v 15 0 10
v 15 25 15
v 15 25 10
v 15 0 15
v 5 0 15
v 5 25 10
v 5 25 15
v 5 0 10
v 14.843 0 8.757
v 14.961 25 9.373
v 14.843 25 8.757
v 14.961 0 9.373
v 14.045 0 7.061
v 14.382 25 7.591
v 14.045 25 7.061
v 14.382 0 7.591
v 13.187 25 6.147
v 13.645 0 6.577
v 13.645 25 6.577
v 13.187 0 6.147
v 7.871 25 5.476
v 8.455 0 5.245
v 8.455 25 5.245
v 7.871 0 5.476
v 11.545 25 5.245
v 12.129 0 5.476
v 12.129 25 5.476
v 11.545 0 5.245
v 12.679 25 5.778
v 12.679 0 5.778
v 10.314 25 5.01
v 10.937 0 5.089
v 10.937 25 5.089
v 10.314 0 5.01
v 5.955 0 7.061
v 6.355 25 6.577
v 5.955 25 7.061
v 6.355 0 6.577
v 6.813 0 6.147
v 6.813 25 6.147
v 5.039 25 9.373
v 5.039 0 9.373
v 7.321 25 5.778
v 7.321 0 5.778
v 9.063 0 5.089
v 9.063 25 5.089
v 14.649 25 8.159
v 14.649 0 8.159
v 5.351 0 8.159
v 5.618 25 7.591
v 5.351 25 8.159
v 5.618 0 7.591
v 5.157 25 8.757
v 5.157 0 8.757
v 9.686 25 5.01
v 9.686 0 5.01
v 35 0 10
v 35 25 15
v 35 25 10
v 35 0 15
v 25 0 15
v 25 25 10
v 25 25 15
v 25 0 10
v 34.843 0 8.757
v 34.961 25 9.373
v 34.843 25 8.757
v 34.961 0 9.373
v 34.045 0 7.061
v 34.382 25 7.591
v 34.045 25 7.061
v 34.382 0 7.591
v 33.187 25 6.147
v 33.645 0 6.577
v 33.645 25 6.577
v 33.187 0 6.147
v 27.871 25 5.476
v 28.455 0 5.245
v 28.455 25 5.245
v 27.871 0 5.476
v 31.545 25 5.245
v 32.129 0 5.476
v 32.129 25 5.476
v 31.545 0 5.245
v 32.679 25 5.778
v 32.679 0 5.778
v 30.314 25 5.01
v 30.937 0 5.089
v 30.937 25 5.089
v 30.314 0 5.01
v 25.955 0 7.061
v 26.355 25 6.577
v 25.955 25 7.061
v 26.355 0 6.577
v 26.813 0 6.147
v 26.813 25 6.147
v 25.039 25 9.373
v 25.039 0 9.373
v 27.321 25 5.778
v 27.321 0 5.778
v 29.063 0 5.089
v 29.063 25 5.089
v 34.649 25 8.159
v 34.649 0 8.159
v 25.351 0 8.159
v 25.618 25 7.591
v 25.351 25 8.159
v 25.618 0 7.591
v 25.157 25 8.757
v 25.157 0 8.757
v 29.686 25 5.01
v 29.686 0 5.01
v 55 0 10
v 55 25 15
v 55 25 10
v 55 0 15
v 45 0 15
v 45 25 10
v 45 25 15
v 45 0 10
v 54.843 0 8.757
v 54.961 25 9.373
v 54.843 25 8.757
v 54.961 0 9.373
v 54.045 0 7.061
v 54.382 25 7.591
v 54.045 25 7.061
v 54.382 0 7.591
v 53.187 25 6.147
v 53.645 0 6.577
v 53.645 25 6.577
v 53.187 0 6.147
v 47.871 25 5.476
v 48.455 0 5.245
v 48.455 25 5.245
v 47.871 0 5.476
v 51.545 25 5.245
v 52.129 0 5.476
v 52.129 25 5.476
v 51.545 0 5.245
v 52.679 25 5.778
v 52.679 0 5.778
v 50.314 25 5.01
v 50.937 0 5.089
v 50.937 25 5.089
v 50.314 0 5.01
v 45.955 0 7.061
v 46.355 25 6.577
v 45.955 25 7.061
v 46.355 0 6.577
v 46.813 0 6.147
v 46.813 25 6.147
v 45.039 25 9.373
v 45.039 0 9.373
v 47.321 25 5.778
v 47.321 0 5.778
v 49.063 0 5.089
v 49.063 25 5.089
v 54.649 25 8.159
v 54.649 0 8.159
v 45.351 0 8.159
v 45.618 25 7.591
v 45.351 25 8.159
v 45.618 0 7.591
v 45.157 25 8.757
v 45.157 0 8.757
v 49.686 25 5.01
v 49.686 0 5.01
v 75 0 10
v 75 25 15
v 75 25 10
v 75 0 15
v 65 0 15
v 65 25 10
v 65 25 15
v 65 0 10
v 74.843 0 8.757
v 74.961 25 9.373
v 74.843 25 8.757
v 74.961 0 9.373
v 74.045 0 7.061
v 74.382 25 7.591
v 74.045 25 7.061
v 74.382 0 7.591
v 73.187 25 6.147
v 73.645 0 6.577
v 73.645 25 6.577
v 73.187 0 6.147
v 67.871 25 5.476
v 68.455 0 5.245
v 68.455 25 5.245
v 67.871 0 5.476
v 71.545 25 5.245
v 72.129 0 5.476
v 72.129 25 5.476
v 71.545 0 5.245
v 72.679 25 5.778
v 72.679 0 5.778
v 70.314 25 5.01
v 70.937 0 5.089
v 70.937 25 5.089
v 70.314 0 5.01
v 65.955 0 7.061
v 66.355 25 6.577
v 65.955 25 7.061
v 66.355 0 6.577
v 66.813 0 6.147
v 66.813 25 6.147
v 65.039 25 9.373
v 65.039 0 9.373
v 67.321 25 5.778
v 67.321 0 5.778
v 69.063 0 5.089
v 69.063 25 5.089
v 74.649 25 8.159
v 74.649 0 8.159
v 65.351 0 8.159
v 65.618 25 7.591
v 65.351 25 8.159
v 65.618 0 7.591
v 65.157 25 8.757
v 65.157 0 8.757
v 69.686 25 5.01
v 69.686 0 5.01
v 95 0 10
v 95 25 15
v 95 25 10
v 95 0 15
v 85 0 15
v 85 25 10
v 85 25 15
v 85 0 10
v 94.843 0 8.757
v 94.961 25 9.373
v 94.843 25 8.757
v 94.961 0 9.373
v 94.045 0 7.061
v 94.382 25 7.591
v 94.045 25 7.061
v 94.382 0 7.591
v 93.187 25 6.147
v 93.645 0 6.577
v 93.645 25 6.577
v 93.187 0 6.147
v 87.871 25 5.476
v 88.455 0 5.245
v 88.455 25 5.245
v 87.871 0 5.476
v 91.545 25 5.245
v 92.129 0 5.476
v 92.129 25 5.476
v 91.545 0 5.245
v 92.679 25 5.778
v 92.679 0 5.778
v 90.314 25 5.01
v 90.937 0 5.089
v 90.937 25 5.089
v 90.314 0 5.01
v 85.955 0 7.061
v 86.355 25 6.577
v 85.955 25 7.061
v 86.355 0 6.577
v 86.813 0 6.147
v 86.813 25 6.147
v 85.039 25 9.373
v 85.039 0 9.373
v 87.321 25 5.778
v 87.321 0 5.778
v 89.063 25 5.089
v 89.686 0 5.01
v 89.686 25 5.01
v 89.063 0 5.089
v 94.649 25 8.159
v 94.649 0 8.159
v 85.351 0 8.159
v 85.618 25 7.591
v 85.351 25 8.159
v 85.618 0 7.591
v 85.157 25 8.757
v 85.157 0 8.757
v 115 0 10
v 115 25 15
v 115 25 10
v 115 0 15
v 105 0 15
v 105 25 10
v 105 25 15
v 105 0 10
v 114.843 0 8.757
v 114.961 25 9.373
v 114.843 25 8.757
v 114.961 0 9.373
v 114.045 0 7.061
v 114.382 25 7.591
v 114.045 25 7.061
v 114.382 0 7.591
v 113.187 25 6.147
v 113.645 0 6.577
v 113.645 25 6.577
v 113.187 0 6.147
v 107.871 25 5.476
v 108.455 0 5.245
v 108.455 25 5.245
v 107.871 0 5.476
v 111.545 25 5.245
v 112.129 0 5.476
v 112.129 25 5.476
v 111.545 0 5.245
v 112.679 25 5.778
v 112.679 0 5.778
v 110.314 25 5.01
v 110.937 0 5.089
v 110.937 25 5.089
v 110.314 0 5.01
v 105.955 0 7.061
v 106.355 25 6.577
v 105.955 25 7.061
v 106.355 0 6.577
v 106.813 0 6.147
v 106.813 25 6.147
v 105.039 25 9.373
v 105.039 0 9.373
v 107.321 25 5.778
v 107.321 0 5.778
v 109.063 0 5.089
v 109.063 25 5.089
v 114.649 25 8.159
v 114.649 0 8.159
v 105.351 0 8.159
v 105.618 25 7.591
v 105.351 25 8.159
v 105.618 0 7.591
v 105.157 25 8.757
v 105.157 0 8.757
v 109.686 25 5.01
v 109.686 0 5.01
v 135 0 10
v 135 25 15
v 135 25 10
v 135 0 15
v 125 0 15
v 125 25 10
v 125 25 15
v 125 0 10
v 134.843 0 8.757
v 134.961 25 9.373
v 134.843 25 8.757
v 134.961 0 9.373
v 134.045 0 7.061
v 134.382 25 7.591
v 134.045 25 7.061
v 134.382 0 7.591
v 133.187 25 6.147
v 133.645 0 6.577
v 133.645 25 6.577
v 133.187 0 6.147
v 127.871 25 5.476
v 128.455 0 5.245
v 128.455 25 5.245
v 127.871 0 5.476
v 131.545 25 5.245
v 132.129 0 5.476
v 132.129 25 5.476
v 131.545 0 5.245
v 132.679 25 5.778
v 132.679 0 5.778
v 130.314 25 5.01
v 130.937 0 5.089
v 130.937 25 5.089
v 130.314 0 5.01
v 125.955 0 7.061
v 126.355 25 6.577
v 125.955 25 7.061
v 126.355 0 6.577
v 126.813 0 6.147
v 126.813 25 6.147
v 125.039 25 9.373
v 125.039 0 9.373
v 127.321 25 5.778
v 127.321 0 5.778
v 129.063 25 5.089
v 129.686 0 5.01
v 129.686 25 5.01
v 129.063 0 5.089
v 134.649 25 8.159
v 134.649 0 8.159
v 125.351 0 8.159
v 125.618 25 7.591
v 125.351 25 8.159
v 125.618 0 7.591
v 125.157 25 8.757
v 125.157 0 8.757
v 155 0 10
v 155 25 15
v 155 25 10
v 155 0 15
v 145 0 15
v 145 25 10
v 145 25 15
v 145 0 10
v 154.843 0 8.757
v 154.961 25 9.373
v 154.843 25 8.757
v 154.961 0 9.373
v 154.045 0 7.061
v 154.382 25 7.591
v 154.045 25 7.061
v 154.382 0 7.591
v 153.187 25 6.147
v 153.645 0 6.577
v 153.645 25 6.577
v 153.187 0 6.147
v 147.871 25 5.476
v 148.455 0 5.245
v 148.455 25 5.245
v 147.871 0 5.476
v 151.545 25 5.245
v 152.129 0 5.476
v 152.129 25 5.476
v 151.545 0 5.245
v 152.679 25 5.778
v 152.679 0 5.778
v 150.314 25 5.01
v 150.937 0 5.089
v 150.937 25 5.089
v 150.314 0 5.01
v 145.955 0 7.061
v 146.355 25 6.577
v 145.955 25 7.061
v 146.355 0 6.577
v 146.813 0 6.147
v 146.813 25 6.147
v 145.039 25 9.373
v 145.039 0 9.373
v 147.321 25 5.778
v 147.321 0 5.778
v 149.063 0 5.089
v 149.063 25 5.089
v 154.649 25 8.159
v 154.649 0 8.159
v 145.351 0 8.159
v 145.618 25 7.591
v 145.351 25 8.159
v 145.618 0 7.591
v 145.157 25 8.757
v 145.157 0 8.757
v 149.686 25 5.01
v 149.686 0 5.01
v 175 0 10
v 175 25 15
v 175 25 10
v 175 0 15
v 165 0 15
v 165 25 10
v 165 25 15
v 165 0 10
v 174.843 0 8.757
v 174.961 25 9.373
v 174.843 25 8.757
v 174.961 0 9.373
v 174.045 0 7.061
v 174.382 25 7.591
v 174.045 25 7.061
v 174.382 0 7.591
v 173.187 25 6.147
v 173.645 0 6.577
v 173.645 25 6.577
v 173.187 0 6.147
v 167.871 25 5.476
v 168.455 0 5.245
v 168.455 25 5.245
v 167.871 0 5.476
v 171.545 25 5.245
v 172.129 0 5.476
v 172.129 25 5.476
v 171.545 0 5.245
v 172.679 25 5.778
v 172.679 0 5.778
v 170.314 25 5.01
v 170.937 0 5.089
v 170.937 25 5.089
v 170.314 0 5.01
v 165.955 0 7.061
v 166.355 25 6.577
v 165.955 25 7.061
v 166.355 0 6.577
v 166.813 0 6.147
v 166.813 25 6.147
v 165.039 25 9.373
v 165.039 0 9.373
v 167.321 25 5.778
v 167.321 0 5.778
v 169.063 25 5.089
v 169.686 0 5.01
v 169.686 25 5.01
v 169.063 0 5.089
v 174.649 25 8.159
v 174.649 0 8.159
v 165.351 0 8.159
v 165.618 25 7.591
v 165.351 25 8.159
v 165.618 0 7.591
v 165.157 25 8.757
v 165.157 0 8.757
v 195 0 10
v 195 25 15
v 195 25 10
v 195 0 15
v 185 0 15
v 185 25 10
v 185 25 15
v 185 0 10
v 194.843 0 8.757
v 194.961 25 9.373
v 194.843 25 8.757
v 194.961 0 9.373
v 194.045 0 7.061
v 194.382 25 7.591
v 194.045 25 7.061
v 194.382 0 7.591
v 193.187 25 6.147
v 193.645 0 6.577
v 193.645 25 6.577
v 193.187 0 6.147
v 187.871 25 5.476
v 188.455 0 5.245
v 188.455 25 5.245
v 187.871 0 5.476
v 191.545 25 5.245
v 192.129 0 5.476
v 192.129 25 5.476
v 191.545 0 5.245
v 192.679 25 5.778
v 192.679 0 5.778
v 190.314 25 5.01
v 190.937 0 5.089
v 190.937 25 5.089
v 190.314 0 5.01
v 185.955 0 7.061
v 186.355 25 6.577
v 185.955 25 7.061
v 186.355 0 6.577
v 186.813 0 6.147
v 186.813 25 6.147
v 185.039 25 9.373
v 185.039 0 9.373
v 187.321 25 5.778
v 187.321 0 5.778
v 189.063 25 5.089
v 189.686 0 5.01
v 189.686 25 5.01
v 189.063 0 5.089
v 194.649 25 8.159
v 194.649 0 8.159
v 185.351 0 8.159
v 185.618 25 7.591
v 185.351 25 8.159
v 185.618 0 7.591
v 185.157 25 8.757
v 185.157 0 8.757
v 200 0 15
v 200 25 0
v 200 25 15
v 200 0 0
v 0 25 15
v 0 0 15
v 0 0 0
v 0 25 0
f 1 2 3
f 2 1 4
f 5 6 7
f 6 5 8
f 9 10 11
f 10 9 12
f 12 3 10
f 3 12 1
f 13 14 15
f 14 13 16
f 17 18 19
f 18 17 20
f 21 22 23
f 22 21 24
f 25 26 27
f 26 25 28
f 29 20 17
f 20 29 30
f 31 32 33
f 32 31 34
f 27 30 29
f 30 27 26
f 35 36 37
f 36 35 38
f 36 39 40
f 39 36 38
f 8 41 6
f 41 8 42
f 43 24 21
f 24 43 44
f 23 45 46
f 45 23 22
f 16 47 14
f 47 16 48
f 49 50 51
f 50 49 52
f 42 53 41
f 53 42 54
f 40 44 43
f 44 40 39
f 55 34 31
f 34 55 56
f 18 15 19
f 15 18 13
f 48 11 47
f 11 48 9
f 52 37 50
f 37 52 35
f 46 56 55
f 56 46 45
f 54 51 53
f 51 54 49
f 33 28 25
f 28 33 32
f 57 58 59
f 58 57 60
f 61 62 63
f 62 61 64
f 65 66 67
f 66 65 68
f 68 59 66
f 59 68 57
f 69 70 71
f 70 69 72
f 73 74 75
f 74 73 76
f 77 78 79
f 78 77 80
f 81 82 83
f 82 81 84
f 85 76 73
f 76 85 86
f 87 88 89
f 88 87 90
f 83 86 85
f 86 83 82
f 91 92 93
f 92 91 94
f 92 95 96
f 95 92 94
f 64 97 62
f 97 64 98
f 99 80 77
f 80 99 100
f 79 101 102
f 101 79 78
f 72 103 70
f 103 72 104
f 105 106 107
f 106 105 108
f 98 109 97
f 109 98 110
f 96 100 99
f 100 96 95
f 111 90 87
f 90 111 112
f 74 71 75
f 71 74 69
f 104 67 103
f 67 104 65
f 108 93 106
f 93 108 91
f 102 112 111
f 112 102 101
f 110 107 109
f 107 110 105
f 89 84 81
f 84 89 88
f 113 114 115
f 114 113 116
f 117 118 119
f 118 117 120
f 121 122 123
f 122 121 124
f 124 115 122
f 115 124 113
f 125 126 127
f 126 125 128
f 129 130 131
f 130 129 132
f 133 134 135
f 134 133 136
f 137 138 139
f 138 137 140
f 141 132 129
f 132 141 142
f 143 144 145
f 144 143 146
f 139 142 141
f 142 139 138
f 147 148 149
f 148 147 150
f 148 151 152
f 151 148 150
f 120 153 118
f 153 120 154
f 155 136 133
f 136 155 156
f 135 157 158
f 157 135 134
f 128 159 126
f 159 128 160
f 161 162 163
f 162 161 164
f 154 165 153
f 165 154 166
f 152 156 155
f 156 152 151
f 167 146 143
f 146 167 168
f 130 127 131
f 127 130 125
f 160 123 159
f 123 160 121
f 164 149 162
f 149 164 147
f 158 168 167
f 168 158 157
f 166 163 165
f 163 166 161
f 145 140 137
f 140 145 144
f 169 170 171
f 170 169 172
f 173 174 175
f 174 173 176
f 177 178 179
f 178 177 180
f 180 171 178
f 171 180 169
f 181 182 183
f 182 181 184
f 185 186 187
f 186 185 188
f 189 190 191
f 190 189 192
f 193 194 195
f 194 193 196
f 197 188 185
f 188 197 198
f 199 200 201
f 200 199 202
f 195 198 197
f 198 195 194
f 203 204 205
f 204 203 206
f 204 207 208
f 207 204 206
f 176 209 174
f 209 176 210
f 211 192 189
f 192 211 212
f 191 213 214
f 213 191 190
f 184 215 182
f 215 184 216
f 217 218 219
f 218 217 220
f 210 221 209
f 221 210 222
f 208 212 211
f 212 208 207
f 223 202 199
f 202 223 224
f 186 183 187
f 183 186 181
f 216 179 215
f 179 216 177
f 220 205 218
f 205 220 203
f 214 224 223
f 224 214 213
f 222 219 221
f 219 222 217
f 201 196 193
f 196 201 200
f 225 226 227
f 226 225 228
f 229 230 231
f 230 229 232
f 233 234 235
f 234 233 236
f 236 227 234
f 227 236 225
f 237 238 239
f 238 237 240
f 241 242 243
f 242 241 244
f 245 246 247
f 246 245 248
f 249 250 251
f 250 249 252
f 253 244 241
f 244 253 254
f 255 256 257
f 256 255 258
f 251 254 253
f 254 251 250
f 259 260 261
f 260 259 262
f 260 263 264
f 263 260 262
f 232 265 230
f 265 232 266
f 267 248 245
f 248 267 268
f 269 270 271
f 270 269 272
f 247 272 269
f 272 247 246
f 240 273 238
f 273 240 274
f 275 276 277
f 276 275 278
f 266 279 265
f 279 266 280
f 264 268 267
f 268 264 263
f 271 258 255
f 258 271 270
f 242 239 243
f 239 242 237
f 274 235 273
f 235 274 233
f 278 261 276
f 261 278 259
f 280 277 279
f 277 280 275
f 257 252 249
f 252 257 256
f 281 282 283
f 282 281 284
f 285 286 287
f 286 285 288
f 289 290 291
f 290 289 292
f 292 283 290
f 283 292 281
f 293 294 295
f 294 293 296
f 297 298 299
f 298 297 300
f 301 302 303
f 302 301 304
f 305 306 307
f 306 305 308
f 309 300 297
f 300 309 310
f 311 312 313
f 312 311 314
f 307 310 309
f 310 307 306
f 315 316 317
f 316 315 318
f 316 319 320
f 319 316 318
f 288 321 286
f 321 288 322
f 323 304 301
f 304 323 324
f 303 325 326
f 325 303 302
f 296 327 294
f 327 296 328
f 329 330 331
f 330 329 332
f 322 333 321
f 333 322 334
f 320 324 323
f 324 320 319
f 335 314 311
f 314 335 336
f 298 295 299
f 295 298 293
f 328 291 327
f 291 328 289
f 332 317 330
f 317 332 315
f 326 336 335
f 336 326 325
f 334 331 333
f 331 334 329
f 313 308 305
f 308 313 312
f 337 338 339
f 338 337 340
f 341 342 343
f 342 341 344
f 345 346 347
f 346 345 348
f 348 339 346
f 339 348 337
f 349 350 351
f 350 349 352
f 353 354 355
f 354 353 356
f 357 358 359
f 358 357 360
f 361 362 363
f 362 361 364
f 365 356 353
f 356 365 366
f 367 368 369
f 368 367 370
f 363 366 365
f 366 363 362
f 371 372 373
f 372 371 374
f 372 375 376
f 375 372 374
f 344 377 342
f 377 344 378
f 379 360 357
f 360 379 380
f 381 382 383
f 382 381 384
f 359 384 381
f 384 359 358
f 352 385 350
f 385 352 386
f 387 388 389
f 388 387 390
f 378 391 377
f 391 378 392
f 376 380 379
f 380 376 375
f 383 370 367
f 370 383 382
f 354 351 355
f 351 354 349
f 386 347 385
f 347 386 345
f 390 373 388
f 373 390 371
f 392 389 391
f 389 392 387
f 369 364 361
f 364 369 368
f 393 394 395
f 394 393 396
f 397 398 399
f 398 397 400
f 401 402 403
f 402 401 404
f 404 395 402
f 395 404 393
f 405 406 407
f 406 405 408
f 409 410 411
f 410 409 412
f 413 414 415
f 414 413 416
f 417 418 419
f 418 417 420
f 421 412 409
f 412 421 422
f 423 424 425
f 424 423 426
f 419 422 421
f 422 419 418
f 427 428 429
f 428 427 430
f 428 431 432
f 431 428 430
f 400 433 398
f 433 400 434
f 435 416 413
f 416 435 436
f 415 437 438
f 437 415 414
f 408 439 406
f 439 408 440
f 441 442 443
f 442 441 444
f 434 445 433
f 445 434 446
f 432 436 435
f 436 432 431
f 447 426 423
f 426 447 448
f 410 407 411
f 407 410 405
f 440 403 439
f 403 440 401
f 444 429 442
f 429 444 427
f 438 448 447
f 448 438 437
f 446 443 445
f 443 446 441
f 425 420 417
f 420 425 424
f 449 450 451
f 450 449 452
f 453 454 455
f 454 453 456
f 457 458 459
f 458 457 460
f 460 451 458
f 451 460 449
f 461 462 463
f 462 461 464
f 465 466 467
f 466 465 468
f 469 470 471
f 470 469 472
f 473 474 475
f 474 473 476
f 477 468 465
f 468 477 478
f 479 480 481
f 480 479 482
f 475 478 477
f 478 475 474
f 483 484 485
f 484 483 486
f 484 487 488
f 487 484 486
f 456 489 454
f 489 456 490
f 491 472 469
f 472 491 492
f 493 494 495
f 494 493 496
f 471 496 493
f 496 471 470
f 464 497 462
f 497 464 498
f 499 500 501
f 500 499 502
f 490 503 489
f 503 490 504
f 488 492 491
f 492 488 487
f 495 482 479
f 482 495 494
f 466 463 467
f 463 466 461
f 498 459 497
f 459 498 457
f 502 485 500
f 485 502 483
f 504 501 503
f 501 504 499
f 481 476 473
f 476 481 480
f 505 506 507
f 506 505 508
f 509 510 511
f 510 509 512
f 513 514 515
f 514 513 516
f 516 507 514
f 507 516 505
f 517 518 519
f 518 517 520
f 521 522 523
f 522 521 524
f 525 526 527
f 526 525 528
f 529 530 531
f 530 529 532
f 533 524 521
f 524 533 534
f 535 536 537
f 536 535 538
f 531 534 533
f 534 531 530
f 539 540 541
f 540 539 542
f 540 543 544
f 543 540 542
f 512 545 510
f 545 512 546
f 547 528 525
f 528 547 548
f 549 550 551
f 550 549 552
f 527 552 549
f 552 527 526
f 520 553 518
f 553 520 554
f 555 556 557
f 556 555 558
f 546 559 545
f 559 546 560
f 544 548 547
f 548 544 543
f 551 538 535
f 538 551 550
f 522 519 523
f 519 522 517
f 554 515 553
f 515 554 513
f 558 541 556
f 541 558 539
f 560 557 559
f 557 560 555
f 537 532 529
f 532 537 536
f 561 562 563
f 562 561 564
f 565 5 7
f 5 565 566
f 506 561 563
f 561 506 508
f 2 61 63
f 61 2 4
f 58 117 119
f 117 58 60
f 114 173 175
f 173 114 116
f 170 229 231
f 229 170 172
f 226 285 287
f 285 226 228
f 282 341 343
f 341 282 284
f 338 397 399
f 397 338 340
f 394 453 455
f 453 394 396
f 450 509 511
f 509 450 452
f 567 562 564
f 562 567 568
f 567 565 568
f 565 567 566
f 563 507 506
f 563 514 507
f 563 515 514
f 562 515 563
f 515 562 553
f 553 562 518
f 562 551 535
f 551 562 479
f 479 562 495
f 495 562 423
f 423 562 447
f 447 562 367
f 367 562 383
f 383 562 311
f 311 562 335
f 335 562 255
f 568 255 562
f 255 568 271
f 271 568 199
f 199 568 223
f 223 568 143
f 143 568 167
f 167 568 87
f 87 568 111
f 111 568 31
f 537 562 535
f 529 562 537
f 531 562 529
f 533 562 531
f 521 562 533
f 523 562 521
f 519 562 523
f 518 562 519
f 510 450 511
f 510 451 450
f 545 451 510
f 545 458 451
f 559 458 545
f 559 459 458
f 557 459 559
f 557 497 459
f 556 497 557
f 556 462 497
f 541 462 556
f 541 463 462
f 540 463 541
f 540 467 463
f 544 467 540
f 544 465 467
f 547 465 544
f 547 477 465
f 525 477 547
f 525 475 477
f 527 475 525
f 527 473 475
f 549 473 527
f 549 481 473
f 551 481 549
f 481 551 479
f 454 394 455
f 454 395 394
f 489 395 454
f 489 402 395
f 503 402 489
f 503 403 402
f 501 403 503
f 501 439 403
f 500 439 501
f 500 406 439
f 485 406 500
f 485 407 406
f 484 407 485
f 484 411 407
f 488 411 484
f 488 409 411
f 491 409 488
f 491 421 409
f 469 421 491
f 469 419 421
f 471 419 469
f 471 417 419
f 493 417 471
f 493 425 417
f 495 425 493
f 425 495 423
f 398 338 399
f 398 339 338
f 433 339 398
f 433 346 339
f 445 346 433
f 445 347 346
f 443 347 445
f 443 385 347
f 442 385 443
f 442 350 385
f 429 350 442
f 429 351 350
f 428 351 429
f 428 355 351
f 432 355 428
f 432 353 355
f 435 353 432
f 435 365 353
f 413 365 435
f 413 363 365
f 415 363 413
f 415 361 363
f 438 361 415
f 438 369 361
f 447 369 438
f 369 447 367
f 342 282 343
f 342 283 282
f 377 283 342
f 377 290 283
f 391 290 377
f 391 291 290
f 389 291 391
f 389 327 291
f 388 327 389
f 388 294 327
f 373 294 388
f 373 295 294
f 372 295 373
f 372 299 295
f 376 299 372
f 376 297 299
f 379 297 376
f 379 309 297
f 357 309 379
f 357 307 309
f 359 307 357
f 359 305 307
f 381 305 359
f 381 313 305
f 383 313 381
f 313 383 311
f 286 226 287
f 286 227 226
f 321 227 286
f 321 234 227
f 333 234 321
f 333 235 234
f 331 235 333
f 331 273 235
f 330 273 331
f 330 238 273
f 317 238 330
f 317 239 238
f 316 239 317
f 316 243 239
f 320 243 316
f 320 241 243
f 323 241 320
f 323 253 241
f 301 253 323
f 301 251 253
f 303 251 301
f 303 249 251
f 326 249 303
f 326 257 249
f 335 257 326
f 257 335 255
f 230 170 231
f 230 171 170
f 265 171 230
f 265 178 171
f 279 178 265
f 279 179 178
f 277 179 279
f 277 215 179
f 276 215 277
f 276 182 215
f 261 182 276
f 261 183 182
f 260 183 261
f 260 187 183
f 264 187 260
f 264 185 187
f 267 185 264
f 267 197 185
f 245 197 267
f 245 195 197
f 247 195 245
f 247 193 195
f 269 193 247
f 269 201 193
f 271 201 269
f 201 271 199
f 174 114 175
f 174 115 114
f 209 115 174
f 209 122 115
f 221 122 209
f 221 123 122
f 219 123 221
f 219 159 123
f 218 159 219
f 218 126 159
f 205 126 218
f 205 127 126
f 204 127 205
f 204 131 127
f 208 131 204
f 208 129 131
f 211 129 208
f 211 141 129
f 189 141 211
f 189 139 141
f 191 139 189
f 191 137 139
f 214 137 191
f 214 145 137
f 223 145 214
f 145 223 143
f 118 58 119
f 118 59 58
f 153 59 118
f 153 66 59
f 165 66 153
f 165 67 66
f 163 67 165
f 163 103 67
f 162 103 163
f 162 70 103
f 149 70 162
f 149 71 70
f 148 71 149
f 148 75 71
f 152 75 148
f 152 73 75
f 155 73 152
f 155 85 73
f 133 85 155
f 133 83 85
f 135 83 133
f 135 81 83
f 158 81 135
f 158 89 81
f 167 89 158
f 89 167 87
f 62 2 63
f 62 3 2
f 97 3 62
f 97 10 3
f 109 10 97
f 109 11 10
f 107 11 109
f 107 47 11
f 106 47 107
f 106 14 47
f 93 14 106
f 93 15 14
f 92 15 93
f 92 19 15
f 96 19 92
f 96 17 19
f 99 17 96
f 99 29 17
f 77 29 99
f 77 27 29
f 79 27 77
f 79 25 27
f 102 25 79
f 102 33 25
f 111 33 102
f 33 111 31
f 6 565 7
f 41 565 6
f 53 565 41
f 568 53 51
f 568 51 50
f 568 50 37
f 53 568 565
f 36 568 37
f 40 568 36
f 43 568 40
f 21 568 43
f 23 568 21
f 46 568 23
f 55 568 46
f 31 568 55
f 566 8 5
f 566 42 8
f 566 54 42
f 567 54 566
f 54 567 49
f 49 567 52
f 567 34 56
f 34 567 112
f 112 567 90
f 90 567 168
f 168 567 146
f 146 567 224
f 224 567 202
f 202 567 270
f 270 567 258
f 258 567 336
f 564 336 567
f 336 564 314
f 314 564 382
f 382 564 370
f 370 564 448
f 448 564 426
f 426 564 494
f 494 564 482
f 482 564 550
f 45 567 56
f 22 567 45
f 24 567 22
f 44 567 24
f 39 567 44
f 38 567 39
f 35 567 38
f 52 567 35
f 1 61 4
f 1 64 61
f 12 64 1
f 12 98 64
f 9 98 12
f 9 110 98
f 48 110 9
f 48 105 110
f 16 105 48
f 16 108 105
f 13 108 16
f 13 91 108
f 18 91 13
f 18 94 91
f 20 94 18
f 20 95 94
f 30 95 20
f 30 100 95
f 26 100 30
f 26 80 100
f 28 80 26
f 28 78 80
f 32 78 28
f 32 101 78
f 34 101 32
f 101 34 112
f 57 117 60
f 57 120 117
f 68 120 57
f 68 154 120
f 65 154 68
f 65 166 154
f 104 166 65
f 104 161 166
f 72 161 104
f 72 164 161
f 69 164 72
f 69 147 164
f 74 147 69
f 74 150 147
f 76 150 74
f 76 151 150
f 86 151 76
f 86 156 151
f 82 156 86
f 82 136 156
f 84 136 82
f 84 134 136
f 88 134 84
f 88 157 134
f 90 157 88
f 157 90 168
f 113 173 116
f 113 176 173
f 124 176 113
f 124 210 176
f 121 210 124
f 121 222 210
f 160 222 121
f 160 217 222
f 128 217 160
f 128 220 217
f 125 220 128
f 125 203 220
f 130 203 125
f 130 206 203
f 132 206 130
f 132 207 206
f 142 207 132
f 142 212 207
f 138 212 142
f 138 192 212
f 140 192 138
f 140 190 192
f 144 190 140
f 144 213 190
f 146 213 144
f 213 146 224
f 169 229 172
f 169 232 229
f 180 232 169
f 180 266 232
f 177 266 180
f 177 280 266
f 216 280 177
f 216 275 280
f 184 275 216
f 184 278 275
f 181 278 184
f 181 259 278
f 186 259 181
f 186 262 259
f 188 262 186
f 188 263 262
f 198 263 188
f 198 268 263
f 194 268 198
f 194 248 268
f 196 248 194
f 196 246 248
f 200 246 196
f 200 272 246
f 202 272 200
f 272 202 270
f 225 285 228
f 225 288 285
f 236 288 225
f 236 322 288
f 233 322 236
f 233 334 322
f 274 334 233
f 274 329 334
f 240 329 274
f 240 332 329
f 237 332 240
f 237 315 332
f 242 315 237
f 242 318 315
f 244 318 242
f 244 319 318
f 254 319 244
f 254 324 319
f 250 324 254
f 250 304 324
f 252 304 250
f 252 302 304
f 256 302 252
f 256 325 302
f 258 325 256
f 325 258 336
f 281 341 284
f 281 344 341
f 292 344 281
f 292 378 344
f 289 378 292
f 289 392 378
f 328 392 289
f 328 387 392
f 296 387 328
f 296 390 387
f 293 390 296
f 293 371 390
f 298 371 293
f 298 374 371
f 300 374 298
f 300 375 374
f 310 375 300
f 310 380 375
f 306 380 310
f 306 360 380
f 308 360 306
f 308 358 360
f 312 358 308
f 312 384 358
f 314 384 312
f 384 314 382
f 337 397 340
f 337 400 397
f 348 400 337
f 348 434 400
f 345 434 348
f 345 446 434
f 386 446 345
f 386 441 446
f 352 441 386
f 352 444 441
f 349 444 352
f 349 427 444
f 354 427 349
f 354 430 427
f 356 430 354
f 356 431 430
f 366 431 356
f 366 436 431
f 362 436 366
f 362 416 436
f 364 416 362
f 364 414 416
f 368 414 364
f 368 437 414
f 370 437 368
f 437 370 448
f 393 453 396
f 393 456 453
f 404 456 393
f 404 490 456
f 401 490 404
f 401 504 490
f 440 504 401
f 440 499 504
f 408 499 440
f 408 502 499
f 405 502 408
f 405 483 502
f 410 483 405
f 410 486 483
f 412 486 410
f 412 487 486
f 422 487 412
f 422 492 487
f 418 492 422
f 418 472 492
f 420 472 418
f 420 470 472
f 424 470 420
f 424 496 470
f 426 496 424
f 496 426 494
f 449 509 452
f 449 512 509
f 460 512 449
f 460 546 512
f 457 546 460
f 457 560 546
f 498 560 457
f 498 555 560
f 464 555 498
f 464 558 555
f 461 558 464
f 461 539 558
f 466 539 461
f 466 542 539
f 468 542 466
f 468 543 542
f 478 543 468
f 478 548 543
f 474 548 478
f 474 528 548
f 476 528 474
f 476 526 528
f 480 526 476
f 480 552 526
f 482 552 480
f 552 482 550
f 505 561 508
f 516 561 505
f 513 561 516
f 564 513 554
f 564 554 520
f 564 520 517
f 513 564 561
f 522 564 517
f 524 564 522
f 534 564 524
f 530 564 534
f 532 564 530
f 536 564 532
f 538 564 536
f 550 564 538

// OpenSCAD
//perameters
organizerHeight = 15;
organizerWidth = 25;

numberOfTools = 10;
toolCutoutWidth = 10;
toolCutoutDepth = 10;
spaceBetweenToolCutouts = 10;

//Find the initial length of the organizer
organizerLength = (numberOfTools*toolCutoutWidth)+(numberOfTools*spaceBetweenToolCutouts);
difference () {
//Generate the base shape
cube(size=[organizerLength,organizerWidth,organizerHeight], center = false);
    for(i = [0:numberOfTools-1]) {
        //Generate a cutout for each number of tools
        cutoutSpot = (spaceBetweenToolCutouts/2) + (i * (toolCutoutWidth+spaceBetweenToolCutouts));
        
        //Cube for the flat sides
        translate([cutoutSpot,-5,organizerHeight-toolCutoutDepth+toolCutoutWidth/2])
        cube([toolCutoutWidth,organizerWidth+10, toolCutoutDepth]);
        
        //Cylinder for the rounded bottom
        rotate([-90,0,0])
        translate([toolCutoutWidth/2+cutoutSpot,-(organizerHeight)+toolCutoutDepth-toolCutoutWidth/2,-10])
        cylinder(h=organizerWidth+20, r=toolCutoutWidth/2, center=false, $fn=50);
    }
}
